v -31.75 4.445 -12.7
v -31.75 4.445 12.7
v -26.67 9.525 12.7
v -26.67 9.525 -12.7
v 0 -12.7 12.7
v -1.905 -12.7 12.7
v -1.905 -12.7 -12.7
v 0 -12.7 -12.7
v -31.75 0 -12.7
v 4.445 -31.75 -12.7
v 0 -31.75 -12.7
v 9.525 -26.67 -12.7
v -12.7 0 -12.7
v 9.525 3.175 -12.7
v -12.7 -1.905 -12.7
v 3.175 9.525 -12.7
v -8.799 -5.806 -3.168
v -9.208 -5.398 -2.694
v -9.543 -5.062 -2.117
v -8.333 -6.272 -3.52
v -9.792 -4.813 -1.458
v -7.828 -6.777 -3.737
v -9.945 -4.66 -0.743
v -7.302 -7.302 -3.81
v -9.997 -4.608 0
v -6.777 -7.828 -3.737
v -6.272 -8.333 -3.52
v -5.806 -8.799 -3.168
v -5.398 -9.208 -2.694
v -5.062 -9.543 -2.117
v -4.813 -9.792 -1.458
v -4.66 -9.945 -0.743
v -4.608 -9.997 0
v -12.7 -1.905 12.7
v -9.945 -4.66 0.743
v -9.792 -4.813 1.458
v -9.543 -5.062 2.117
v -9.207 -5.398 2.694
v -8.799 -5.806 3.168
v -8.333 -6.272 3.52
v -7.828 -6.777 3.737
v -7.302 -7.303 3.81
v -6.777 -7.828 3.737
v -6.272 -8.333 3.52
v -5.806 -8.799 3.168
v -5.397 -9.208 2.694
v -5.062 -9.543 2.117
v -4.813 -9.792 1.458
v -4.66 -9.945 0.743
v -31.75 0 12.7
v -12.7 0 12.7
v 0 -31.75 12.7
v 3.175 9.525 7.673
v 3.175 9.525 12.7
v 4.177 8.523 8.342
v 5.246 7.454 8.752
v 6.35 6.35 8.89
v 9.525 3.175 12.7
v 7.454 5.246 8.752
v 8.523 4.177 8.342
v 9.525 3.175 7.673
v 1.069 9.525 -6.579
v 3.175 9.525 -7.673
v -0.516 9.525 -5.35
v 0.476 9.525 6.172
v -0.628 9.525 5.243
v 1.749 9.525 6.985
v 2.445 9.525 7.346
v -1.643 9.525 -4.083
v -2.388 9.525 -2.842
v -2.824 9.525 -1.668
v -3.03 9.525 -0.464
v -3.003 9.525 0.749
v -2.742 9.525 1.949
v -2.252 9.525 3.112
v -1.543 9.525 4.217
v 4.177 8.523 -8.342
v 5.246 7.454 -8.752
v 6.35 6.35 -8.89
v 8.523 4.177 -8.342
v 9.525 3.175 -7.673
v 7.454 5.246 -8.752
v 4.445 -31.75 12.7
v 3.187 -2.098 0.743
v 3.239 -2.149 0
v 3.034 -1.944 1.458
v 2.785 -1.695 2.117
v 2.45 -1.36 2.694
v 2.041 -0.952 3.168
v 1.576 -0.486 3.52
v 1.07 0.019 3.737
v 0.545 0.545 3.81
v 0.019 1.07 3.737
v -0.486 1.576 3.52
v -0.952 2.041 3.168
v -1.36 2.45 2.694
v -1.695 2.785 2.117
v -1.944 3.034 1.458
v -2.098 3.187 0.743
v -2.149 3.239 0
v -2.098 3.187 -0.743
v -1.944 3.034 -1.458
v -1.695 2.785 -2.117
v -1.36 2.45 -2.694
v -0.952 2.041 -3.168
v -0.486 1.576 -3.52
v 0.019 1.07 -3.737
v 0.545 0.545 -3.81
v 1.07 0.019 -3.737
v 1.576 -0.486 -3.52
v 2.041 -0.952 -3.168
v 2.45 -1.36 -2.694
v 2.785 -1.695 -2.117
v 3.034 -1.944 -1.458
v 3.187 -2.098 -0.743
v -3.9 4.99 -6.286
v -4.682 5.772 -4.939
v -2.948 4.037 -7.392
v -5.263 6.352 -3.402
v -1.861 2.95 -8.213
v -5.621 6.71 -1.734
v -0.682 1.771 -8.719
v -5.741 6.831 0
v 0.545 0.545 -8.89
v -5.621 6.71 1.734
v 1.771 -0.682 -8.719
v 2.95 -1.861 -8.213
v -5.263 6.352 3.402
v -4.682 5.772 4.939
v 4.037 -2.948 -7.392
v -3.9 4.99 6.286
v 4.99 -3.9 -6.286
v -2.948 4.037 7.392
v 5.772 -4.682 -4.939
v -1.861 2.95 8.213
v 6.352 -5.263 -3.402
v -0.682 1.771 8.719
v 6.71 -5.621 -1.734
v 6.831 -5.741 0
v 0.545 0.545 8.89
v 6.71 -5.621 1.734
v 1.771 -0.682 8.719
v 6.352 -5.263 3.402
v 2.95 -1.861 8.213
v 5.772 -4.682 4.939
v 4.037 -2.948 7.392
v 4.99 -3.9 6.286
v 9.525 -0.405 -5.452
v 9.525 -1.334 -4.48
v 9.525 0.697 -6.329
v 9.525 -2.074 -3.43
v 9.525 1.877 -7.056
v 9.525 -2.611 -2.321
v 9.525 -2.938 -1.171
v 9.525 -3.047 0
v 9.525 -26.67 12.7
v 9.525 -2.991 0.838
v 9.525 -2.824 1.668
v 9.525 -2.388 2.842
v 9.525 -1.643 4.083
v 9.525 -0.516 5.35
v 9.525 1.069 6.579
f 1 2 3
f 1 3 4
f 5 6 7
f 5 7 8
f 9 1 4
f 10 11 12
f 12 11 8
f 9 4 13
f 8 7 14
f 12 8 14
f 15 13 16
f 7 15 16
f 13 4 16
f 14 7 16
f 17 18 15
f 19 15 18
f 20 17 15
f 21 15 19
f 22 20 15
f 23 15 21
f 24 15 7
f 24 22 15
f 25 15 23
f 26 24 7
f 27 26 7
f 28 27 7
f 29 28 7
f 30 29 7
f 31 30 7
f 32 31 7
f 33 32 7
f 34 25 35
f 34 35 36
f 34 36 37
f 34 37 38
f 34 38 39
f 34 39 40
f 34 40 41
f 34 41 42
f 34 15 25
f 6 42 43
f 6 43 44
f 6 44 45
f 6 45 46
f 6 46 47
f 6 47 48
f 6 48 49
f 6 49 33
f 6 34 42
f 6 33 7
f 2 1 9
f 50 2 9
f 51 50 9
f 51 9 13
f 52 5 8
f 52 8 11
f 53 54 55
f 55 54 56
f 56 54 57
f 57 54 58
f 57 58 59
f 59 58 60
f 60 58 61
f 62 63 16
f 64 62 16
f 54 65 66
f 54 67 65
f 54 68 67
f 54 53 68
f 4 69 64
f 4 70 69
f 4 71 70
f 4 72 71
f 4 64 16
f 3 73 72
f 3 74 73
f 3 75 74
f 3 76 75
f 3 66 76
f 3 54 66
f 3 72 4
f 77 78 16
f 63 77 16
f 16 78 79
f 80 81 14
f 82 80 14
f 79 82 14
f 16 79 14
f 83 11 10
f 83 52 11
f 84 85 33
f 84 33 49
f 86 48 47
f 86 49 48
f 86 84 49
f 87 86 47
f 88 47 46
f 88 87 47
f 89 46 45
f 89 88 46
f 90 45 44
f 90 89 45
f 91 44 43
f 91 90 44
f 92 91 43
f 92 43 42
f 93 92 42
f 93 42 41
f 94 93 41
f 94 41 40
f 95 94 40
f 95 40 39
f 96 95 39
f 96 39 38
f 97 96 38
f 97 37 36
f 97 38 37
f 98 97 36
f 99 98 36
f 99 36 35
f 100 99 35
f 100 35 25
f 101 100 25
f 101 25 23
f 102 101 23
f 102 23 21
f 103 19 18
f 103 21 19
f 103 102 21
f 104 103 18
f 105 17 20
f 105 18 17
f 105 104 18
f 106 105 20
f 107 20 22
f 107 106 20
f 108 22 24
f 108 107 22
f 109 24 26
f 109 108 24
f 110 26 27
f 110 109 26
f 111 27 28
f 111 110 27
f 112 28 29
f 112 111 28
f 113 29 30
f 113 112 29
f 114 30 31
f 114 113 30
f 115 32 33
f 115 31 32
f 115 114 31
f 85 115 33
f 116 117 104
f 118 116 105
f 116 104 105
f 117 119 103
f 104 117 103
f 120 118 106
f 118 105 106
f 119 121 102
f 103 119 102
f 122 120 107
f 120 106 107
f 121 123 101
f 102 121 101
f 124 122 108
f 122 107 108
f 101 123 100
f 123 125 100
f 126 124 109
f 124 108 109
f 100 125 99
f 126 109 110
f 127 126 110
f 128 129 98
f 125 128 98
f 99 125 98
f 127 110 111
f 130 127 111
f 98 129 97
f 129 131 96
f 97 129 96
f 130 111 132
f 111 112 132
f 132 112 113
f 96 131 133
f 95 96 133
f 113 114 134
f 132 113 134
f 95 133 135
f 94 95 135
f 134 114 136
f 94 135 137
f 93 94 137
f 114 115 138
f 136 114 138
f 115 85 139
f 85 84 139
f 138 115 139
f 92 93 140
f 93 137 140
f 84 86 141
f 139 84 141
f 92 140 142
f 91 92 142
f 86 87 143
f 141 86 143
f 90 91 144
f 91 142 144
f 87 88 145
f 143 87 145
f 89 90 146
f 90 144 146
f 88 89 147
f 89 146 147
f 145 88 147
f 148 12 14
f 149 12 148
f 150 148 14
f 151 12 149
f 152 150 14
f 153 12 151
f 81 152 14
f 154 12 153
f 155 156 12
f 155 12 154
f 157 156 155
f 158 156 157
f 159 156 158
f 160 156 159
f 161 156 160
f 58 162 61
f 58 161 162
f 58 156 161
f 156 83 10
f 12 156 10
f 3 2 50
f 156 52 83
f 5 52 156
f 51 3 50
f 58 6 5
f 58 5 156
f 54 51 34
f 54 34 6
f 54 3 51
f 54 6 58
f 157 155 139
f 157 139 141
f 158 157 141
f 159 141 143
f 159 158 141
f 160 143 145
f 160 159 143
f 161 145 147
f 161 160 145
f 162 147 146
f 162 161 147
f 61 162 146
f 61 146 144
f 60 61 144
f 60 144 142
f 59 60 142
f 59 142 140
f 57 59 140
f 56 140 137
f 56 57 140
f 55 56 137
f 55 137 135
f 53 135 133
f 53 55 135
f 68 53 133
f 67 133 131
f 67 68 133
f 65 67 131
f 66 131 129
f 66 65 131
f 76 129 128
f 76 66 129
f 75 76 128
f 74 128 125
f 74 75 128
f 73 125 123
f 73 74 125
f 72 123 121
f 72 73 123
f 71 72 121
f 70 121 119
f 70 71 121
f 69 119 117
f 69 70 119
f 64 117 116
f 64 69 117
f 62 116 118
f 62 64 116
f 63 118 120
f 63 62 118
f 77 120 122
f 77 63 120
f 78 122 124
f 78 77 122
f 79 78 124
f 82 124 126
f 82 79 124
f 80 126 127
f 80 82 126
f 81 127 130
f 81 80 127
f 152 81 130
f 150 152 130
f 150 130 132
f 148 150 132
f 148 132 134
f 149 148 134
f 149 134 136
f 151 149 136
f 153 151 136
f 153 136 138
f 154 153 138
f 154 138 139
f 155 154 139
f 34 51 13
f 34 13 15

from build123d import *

# Parameters (mm, degrees)
F1_DEPTH = 12.7
F4_SIZE  = 6.35
F3_R     = 3.81
F5_DEPTH = 58.372665
F6_R     = 8.89
F7_DEPTH = 12.7
F8_SIZE  = 5.08


with BuildPart() as f1:
    # F0 (on Top) → F1 (new body, symmetric)
    with BuildSketch(Plane.XY):
        Polygon((-31.75, 9.525), (-31.75, 0), (-12.7, 0), (-12.7, -1.905), (-1.905, -12.7), (0, -12.7), (0, -31.75), (9.525, -31.75), (9.525, 9.525), align=None)
    extrude(amount=F1_DEPTH, both=True)

    # F4
    f4_edges = [f1.edges().sort_by_distance(p)[0] for p in [
        (9.525, 9.525, 0),
    ]]
    chamfer(f4_edges, length=F4_SIZE)

    # F3 (on face) → F5 (cut, through all)
    with BuildSketch(Plane(origin=(9.525, 9.525, 0), x_dir=(0.707107, -0.707107, 0), z_dir=(-0.707107, -0.707107, 0))):
        Circle(F3_R)
    extrude(amount=F5_DEPTH, mode=Mode.SUBTRACT)

    # F6 (on face) → F7 (cut)
    with BuildSketch(Plane(origin=(9.525, 9.525, 0), x_dir=(0.707107, -0.707107, 0), z_dir=(-0.707107, -0.707107, 0))):
        Circle(F6_R)
    extrude(amount=F7_DEPTH, mode=Mode.SUBTRACT)

    # F8
    f8_edges = [f1.edges().sort_by_distance(p)[0] for p in [
        (9.525, -31.75, 0),
        (-31.75, 9.525, 0),
    ]]
    chamfer(f8_edges, length=F8_SIZE)


solid = f1.part
